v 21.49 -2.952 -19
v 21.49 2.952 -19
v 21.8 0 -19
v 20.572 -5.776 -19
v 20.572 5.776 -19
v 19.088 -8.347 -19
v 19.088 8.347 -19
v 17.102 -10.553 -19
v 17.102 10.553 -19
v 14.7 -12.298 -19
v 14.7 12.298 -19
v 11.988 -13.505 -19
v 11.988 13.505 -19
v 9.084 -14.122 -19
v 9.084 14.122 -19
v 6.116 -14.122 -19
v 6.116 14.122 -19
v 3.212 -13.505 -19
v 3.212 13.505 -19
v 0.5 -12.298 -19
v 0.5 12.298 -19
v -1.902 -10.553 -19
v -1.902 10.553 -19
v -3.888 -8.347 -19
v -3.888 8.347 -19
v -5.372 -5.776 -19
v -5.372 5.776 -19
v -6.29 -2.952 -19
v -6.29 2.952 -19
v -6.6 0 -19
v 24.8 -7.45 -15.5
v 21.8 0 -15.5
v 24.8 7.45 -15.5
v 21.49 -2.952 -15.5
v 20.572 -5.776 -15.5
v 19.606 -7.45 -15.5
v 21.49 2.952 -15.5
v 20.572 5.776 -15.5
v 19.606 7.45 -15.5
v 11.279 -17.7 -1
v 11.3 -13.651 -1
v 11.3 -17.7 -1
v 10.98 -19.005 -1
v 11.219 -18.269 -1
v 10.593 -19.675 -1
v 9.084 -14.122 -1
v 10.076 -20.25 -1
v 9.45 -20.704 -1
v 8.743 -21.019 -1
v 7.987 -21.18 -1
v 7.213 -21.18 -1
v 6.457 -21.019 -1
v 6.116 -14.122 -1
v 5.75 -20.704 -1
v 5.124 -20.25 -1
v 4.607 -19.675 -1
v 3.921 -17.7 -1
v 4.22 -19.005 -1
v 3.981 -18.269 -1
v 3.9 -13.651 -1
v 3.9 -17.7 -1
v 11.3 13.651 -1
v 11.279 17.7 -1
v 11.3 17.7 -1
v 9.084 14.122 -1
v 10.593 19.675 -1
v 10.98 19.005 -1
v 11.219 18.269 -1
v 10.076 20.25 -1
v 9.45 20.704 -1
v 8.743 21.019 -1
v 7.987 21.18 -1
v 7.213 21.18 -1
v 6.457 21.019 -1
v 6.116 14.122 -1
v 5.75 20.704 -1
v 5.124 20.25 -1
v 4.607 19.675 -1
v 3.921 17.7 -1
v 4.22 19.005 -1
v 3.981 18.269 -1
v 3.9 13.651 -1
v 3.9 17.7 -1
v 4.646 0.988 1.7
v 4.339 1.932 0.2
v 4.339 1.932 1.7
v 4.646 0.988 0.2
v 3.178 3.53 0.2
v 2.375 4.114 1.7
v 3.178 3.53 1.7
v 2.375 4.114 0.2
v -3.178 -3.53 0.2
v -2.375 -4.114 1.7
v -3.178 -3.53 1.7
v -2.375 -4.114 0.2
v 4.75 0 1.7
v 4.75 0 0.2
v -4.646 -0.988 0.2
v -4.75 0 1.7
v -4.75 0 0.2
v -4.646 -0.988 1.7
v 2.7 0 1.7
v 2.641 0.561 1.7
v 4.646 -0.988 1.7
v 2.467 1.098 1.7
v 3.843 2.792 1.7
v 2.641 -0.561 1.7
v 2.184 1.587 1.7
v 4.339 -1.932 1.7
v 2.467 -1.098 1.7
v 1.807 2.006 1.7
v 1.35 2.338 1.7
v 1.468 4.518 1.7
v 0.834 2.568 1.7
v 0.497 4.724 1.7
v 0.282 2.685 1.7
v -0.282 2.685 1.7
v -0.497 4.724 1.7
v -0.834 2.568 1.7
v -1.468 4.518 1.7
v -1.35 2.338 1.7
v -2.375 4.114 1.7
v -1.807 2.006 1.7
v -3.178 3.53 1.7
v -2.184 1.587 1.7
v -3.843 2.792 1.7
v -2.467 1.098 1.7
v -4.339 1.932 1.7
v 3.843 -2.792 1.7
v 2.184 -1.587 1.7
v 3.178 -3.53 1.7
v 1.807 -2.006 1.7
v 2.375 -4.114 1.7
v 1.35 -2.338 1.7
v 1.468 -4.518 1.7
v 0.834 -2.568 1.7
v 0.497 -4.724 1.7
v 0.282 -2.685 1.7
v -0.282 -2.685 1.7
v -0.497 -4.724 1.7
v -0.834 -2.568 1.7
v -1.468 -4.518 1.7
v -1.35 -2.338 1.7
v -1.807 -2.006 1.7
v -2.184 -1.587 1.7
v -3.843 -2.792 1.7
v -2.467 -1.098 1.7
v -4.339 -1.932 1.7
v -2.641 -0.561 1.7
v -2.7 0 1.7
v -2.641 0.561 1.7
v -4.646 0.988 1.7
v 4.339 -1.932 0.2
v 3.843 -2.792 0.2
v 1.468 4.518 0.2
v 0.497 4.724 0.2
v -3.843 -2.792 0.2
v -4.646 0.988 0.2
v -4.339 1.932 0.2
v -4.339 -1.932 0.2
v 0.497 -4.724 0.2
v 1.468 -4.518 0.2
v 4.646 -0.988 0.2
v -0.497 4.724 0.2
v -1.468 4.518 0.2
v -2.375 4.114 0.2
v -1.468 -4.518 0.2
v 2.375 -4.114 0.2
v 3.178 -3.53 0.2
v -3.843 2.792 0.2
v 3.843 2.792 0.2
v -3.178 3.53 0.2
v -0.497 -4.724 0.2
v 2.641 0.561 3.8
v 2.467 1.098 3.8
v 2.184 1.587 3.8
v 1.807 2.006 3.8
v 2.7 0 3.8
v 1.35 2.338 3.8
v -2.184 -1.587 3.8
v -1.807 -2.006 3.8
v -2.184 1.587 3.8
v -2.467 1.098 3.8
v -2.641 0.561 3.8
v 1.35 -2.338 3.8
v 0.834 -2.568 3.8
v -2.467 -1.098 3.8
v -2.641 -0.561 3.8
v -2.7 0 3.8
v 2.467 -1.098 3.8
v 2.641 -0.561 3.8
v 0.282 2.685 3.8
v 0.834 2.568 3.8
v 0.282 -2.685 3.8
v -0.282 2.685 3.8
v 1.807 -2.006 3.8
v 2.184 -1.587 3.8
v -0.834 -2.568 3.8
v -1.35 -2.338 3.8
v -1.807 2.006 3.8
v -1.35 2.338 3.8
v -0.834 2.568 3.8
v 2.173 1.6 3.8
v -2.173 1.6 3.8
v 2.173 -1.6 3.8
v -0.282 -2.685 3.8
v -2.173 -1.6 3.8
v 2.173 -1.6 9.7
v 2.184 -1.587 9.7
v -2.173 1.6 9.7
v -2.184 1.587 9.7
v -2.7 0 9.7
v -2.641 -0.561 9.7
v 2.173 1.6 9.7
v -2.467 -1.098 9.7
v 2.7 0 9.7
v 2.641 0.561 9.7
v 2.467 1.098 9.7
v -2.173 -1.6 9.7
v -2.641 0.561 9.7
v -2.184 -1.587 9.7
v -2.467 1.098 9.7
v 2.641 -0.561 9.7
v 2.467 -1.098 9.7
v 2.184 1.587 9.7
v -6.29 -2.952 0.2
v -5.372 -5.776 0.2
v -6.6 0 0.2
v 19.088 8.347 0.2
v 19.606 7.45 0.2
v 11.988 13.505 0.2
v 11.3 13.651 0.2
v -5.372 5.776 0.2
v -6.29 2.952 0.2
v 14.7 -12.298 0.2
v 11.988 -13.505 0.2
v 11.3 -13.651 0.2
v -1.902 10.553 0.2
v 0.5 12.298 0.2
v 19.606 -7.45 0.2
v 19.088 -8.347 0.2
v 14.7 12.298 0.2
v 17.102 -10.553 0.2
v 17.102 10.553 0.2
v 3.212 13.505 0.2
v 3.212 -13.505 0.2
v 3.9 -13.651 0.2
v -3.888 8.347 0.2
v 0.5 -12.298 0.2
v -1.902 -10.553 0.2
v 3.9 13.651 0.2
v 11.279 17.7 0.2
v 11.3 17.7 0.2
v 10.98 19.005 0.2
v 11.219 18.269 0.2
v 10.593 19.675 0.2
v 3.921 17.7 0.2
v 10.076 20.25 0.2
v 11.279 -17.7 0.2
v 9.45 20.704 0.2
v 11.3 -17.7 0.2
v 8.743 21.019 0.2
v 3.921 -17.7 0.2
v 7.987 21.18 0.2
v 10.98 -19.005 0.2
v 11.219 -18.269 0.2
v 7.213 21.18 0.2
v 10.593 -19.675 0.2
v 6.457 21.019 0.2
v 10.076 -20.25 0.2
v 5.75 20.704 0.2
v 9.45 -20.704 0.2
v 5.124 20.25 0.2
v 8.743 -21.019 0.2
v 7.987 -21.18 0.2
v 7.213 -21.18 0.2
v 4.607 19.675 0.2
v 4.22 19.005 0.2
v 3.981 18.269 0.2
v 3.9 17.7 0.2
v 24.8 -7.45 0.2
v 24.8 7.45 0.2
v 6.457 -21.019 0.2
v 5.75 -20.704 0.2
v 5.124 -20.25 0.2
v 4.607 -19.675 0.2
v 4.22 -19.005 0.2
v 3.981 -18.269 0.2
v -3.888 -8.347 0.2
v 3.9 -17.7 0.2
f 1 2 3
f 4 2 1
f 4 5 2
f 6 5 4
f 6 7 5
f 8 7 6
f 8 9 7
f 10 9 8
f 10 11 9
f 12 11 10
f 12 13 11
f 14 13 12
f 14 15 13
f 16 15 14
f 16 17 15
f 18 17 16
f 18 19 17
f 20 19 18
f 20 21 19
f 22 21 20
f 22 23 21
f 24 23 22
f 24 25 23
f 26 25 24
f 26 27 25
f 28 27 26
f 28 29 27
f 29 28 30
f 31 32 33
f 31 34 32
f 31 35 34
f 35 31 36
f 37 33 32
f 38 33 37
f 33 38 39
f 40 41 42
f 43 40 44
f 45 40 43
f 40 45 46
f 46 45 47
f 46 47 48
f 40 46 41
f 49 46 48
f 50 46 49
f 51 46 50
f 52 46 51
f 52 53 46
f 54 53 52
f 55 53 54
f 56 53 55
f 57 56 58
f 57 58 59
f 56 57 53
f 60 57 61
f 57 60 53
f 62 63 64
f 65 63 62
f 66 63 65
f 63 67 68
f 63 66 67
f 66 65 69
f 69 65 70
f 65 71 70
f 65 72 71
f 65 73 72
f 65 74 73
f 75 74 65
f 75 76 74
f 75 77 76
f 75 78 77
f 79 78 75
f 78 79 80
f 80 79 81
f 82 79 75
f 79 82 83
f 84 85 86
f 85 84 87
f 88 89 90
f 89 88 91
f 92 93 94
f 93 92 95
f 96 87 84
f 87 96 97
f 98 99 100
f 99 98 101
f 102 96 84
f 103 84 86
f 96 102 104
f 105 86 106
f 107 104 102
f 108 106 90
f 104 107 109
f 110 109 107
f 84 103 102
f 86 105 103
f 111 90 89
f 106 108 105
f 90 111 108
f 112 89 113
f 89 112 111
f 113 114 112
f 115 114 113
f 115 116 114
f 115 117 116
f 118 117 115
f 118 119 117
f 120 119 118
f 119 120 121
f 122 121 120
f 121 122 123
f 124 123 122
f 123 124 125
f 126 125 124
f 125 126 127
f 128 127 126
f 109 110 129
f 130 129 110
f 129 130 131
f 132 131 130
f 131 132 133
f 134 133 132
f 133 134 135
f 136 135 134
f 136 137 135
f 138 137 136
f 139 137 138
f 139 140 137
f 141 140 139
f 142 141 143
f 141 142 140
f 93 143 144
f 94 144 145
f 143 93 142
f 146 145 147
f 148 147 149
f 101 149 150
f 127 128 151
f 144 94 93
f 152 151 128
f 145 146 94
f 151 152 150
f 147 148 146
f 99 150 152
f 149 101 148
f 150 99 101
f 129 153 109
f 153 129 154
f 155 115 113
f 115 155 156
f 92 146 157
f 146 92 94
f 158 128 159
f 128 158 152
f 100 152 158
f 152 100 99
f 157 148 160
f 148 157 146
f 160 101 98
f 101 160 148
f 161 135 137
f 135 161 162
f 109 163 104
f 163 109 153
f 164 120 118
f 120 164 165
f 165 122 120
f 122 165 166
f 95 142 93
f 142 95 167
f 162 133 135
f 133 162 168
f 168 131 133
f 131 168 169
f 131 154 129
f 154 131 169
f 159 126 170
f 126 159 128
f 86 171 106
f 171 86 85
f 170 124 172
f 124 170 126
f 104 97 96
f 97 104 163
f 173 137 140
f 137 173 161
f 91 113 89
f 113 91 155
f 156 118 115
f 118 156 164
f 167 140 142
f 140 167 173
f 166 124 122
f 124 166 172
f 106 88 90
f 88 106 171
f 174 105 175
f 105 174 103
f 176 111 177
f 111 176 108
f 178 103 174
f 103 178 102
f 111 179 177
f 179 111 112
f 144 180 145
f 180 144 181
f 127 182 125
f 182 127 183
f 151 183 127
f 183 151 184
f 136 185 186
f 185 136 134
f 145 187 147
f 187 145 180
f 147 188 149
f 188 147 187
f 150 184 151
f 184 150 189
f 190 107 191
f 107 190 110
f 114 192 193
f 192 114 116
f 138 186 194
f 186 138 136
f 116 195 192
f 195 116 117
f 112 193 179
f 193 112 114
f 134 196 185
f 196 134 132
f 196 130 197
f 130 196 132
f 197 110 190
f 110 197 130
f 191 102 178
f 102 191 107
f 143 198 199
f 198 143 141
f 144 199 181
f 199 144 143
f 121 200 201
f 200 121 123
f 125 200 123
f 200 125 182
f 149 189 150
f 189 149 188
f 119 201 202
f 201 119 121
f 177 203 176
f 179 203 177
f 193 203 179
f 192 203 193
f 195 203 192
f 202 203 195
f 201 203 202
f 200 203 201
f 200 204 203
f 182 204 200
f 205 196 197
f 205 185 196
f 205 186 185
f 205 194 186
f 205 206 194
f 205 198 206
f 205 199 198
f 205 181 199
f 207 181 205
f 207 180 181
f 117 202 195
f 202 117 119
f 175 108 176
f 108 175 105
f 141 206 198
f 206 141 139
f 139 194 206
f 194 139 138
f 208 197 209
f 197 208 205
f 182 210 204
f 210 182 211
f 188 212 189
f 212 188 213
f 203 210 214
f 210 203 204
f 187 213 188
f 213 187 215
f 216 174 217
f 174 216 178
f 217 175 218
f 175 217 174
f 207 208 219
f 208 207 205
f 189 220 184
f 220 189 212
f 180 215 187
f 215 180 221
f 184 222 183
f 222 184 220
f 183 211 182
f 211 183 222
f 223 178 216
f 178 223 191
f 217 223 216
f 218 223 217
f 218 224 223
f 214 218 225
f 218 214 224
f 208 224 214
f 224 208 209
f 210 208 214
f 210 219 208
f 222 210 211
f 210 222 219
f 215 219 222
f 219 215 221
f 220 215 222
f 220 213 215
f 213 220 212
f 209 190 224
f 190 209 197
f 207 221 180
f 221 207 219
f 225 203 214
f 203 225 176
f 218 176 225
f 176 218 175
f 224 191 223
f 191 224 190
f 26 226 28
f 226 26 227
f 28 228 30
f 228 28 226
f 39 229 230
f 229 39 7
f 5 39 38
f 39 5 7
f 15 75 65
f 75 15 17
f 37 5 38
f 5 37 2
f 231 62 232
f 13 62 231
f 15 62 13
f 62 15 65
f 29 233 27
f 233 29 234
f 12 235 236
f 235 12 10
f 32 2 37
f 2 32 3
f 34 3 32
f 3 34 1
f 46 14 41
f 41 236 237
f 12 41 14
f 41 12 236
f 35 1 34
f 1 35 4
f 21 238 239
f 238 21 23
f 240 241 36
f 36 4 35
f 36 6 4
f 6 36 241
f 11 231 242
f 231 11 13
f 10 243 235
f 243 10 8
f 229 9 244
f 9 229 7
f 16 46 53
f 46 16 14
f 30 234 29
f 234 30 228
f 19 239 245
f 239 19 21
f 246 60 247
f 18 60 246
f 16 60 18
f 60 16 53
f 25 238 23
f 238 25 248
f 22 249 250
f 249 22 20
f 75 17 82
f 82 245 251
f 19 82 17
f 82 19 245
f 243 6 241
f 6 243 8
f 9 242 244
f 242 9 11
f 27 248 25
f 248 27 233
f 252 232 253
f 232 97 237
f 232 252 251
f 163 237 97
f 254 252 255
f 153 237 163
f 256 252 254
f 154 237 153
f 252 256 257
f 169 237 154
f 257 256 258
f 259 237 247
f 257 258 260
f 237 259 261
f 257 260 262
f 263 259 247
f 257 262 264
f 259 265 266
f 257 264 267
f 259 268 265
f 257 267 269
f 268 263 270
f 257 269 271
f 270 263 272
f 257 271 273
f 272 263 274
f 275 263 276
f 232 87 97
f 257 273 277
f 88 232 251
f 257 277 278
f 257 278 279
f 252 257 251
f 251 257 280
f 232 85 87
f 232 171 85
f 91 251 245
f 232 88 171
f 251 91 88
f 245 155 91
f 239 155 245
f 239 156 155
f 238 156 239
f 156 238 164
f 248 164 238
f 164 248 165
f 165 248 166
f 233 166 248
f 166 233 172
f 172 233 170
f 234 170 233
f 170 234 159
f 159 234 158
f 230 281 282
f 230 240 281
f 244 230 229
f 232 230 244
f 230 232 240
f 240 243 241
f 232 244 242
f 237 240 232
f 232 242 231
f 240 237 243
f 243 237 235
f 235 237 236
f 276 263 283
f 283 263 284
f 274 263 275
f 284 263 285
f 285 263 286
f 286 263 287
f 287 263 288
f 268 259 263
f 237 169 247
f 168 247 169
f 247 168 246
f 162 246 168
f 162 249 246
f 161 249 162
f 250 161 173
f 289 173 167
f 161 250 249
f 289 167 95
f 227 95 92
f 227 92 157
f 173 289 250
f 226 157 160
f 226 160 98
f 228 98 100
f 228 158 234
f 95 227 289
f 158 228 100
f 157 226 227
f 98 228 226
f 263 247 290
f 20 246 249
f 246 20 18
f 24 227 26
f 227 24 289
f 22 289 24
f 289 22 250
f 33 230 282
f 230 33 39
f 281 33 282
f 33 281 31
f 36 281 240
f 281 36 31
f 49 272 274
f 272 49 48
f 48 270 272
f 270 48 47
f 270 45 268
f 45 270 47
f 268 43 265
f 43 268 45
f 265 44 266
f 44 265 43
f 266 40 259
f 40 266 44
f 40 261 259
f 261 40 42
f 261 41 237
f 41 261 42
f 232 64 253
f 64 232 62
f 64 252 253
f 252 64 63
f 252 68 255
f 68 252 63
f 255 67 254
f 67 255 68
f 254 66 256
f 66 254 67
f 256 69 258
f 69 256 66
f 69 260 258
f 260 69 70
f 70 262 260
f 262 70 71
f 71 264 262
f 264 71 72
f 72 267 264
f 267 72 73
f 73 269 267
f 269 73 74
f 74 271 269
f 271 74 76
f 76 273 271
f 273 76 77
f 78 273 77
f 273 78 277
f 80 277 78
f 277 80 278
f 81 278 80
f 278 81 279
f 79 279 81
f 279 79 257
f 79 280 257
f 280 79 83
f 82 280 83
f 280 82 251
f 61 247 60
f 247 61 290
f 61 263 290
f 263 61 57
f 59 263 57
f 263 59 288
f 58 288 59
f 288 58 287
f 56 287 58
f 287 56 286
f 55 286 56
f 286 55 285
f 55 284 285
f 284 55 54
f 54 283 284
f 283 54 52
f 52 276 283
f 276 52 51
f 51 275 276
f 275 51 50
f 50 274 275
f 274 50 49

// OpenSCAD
/*
body_diameter = 24;
body_height = 19.5;
wire_cover_center = 28.4 - (body_diameter/2) - (10/2);
wire_cover_height = 16.1;
wire_cover_width = 14;

shaft_lib_diameter = 7.9;
shaft_lib_height = 1.4;
shaft_center_offset = (shaft_lib_diameter) - 1.5;
shaft_circular_diameter = 5;
shaft_square_width = 3;
shaft_circular_length = 3;
shaft_total_length = 14;
    
mounting_holes_distance = 31.5;
mounting_holes_diameter = 4;
mounting_holes_flang_diameter = 7;
mounting_holes_flang_thickness = 1;
*/

body_diameter = 28;
body_height = 19;
wire_cover_center = 31 - (body_diameter/2) - (10/2);
wire_cover_height = 15.5;
wire_cover_width = 14.5;

shaft_lib_diameter = 9.1;
shaft_lib_height = 1.5;
shaft_center_offset = (shaft_lib_diameter) - 1.5;
shaft_circular_diameter = 5;
shaft_square_width = 3;
shaft_circular_length = 2;
shaft_total_length = 8;
    
mounting_holes_distance = 35;
mounting_holes_diameter = 4;
mounting_holes_flang_diameter = 7;
mounting_holes_flang_thickness = 1;


//center_pos=[0,0,0]; // normal
center_pos = [shaft_center_offset, 0, -body_height]; // shaft
//center_pos = [0, 0, -body_height]; // mounting


function shaft_offset() = shaft_center_offset;
function motor_mounting_flang_length() = mounting_holes_distance + 2*mounting_holes_flang_diameter;
function motor_mounting_pos() = [[shaft_center_offset, -mounting_holes_distance/2], [shaft_center_offset, mounting_holes_distance/2]];



module _25byj() {
    
    translate(center_pos) {
        linear_extrude(body_height) circle(d=body_diameter);
        translate([wire_cover_center,0,body_height-wire_cover_height]) linear_extrude(wire_cover_height) square([10,wire_cover_width], center=true);
        translate([-shaft_center_offset, 0, body_height]) linear_extrude(shaft_lib_height) circle(d=shaft_lib_diameter);
        translate([-shaft_center_offset, 0, body_height+shaft_lib_height]) linear_extrude(shaft_circular_length) circle(d=shaft_circular_diameter);
        translate([-shaft_center_offset, 0, body_height+shaft_lib_height+shaft_circular_length]) linear_extrude(shaft_total_length-shaft_circular_length) intersection() {
            circle(d=shaft_circular_diameter);
            square([shaft_circular_diameter, shaft_square_width], center=true);
        }
        
        translate([0,0,body_height-mounting_holes_flang_thickness]) linear_extrude(mounting_holes_flang_thickness) difference() {
            union() {
                square([mounting_holes_flang_diameter, mounting_holes_distance], center=true);
                translate([0, mounting_holes_distance/2]) circle(d=mounting_holes_flang_diameter);
                translate([0, -mounting_holes_distance/2]) circle(d=mounting_holes_flang_diameter);
            }
            translate([0, mounting_holes_distance/2]) circle(d=mounting_holes_diameter);
            translate([0, -mounting_holes_distance/2]) circle(d=mounting_holes_diameter);
        }
    }
}

module _25byj_cutout() {
    
    translate(center_pos) {
        linear_extrude(body_height+0.2) circle(d=body_diameter+0.4);
        translate([wire_cover_center,0,body_height-wire_cover_height]) linear_extrude(wire_cover_height+0.2) square([10+0.4,wire_cover_width+0.4], center=true);
        translate([-shaft_center_offset,0,body_height]) _25byj_shaft_cutout();
        
        translate([0,0,body_height-mounting_holes_flang_thickness]) linear_extrude(mounting_holes_flang_thickness+0.2) {
            square([mounting_holes_flang_diameter+0.4, mounting_holes_distance+0.4], center=true);
            translate([0, mounting_holes_distance/2]) circle(d=mounting_holes_flang_diameter+0.4);
            translate([0, -mounting_holes_distance/2]) circle(d=mounting_holes_flang_diameter+0.4);            
        }
    }
}


module _25byj_shaft_cutout() {
    
    linear_extrude(shaft_lib_height+0.2) circle(d=shaft_lib_diameter+0.4);
    linear_extrude(shaft_lib_height+shaft_circular_length+shaft_lib_height-0.2-1) circle(d=shaft_circular_diameter+0.4);
    linear_extrude(shaft_lib_height+shaft_circular_length+shaft_total_length-shaft_circular_length+0.2) intersection() {
        circle(d=shaft_circular_diameter+0.4);
        square([shaft_circular_diameter+0.4, shaft_square_width+0.2], center=true);
    }
}





//translate(motor_mounting_pos()[0]) circle(d=5);

_25byj($fn=30);
#_25byj_cutout($fn=30);
//_25byj_shaft_cutout($fn=30);
